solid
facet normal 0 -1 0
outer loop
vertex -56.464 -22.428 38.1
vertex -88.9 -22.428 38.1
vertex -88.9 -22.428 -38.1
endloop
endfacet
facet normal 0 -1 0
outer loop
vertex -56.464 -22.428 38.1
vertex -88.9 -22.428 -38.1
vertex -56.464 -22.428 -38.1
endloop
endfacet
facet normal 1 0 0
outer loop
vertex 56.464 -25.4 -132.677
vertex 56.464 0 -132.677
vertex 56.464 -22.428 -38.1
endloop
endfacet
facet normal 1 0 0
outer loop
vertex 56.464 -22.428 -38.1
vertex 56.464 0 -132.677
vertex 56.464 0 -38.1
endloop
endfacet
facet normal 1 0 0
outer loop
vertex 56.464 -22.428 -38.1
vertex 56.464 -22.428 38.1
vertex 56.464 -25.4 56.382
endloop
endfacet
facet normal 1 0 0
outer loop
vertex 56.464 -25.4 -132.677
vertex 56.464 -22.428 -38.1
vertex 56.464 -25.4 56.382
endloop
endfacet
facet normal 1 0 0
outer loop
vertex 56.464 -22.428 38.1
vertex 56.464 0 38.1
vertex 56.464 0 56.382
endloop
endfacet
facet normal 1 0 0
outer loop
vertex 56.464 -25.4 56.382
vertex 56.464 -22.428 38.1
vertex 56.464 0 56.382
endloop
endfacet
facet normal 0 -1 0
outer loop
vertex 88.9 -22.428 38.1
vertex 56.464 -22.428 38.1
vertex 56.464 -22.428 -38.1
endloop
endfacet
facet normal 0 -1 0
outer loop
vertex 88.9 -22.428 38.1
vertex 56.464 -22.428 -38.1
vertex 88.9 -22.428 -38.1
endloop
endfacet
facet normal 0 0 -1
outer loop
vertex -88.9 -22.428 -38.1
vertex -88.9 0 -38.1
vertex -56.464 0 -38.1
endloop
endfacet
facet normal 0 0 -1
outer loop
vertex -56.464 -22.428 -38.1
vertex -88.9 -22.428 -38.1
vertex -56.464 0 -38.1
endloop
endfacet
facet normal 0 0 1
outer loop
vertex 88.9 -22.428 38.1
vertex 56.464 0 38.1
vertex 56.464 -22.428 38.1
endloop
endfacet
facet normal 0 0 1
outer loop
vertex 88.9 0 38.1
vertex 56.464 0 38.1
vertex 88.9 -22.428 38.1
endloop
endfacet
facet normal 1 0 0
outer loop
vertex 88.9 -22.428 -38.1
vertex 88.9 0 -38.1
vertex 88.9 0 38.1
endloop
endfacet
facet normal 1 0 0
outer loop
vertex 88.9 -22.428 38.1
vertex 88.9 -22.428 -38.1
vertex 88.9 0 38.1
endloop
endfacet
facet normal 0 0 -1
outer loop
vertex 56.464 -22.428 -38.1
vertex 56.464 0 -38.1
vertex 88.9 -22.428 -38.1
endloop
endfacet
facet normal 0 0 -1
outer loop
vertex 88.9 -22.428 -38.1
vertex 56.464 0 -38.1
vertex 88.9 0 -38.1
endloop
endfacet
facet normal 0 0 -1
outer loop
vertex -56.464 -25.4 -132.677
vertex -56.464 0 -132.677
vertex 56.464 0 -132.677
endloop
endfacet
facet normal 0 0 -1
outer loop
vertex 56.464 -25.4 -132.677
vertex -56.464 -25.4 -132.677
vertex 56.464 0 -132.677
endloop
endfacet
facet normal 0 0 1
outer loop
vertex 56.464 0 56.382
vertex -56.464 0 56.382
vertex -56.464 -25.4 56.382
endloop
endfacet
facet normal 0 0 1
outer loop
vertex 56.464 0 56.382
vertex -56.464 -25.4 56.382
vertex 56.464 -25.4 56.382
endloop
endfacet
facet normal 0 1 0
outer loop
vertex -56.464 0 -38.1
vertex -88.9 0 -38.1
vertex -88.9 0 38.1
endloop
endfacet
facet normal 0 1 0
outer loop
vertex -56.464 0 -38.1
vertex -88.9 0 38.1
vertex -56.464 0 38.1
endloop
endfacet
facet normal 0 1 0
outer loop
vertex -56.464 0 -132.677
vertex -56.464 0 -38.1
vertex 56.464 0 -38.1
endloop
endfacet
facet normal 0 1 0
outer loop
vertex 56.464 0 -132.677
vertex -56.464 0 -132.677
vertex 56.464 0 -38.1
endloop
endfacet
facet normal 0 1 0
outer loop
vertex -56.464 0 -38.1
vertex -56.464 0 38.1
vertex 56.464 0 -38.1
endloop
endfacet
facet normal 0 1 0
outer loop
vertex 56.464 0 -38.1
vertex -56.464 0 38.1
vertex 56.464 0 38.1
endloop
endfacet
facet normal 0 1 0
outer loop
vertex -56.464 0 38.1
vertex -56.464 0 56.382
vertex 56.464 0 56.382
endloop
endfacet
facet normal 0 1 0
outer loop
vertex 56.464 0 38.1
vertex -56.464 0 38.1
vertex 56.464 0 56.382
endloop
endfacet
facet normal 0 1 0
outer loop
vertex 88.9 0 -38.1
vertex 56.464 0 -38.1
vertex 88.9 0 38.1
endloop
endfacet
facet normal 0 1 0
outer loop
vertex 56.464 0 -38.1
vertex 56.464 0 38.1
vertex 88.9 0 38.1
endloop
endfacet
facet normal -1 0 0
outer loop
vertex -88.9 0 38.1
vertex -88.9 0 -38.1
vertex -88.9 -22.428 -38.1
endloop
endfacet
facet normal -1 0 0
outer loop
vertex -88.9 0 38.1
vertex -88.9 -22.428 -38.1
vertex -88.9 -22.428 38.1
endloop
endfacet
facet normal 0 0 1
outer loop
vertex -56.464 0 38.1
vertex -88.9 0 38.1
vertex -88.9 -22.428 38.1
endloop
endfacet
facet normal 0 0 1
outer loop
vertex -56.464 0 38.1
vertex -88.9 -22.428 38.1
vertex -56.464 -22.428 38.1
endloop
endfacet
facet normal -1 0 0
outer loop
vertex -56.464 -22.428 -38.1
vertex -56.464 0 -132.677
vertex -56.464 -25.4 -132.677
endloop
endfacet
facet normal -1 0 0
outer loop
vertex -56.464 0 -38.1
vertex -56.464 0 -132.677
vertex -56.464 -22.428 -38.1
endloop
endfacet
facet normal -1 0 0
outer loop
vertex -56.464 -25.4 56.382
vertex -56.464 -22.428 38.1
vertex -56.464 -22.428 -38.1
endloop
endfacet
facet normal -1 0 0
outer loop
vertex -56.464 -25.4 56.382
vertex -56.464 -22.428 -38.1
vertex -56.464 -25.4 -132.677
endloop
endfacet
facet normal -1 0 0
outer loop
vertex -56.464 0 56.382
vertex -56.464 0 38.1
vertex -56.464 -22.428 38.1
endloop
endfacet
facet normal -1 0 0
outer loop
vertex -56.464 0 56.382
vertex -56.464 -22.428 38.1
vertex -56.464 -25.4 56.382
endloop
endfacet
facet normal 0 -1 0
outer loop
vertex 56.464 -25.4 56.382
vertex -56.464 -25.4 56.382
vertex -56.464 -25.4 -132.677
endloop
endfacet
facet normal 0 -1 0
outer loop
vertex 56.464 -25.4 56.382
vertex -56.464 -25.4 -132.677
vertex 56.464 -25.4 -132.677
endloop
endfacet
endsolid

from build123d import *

# Parameters (mm, degrees)
F0_W     = 177.8
F0_H     = 76.2
F1_DEPTH = 22.427941
F2_W     = 112.92833
F2_H     = 189.059824
F3_DEPTH = 25.4


with BuildPart() as f1:
    # F0 (on Front) → F1 (new body)
    with BuildSketch(Plane.XZ):
        Rectangle(F0_W, F0_H)
    extrude(amount=F1_DEPTH)

    # F2 (on Front) → F3 (join)
    with BuildSketch(Plane.XZ):
        with Locations((0, -38.147524)):
            Rectangle(F2_W, F2_H)
    extrude(amount=F3_DEPTH)


solid = f1.part
